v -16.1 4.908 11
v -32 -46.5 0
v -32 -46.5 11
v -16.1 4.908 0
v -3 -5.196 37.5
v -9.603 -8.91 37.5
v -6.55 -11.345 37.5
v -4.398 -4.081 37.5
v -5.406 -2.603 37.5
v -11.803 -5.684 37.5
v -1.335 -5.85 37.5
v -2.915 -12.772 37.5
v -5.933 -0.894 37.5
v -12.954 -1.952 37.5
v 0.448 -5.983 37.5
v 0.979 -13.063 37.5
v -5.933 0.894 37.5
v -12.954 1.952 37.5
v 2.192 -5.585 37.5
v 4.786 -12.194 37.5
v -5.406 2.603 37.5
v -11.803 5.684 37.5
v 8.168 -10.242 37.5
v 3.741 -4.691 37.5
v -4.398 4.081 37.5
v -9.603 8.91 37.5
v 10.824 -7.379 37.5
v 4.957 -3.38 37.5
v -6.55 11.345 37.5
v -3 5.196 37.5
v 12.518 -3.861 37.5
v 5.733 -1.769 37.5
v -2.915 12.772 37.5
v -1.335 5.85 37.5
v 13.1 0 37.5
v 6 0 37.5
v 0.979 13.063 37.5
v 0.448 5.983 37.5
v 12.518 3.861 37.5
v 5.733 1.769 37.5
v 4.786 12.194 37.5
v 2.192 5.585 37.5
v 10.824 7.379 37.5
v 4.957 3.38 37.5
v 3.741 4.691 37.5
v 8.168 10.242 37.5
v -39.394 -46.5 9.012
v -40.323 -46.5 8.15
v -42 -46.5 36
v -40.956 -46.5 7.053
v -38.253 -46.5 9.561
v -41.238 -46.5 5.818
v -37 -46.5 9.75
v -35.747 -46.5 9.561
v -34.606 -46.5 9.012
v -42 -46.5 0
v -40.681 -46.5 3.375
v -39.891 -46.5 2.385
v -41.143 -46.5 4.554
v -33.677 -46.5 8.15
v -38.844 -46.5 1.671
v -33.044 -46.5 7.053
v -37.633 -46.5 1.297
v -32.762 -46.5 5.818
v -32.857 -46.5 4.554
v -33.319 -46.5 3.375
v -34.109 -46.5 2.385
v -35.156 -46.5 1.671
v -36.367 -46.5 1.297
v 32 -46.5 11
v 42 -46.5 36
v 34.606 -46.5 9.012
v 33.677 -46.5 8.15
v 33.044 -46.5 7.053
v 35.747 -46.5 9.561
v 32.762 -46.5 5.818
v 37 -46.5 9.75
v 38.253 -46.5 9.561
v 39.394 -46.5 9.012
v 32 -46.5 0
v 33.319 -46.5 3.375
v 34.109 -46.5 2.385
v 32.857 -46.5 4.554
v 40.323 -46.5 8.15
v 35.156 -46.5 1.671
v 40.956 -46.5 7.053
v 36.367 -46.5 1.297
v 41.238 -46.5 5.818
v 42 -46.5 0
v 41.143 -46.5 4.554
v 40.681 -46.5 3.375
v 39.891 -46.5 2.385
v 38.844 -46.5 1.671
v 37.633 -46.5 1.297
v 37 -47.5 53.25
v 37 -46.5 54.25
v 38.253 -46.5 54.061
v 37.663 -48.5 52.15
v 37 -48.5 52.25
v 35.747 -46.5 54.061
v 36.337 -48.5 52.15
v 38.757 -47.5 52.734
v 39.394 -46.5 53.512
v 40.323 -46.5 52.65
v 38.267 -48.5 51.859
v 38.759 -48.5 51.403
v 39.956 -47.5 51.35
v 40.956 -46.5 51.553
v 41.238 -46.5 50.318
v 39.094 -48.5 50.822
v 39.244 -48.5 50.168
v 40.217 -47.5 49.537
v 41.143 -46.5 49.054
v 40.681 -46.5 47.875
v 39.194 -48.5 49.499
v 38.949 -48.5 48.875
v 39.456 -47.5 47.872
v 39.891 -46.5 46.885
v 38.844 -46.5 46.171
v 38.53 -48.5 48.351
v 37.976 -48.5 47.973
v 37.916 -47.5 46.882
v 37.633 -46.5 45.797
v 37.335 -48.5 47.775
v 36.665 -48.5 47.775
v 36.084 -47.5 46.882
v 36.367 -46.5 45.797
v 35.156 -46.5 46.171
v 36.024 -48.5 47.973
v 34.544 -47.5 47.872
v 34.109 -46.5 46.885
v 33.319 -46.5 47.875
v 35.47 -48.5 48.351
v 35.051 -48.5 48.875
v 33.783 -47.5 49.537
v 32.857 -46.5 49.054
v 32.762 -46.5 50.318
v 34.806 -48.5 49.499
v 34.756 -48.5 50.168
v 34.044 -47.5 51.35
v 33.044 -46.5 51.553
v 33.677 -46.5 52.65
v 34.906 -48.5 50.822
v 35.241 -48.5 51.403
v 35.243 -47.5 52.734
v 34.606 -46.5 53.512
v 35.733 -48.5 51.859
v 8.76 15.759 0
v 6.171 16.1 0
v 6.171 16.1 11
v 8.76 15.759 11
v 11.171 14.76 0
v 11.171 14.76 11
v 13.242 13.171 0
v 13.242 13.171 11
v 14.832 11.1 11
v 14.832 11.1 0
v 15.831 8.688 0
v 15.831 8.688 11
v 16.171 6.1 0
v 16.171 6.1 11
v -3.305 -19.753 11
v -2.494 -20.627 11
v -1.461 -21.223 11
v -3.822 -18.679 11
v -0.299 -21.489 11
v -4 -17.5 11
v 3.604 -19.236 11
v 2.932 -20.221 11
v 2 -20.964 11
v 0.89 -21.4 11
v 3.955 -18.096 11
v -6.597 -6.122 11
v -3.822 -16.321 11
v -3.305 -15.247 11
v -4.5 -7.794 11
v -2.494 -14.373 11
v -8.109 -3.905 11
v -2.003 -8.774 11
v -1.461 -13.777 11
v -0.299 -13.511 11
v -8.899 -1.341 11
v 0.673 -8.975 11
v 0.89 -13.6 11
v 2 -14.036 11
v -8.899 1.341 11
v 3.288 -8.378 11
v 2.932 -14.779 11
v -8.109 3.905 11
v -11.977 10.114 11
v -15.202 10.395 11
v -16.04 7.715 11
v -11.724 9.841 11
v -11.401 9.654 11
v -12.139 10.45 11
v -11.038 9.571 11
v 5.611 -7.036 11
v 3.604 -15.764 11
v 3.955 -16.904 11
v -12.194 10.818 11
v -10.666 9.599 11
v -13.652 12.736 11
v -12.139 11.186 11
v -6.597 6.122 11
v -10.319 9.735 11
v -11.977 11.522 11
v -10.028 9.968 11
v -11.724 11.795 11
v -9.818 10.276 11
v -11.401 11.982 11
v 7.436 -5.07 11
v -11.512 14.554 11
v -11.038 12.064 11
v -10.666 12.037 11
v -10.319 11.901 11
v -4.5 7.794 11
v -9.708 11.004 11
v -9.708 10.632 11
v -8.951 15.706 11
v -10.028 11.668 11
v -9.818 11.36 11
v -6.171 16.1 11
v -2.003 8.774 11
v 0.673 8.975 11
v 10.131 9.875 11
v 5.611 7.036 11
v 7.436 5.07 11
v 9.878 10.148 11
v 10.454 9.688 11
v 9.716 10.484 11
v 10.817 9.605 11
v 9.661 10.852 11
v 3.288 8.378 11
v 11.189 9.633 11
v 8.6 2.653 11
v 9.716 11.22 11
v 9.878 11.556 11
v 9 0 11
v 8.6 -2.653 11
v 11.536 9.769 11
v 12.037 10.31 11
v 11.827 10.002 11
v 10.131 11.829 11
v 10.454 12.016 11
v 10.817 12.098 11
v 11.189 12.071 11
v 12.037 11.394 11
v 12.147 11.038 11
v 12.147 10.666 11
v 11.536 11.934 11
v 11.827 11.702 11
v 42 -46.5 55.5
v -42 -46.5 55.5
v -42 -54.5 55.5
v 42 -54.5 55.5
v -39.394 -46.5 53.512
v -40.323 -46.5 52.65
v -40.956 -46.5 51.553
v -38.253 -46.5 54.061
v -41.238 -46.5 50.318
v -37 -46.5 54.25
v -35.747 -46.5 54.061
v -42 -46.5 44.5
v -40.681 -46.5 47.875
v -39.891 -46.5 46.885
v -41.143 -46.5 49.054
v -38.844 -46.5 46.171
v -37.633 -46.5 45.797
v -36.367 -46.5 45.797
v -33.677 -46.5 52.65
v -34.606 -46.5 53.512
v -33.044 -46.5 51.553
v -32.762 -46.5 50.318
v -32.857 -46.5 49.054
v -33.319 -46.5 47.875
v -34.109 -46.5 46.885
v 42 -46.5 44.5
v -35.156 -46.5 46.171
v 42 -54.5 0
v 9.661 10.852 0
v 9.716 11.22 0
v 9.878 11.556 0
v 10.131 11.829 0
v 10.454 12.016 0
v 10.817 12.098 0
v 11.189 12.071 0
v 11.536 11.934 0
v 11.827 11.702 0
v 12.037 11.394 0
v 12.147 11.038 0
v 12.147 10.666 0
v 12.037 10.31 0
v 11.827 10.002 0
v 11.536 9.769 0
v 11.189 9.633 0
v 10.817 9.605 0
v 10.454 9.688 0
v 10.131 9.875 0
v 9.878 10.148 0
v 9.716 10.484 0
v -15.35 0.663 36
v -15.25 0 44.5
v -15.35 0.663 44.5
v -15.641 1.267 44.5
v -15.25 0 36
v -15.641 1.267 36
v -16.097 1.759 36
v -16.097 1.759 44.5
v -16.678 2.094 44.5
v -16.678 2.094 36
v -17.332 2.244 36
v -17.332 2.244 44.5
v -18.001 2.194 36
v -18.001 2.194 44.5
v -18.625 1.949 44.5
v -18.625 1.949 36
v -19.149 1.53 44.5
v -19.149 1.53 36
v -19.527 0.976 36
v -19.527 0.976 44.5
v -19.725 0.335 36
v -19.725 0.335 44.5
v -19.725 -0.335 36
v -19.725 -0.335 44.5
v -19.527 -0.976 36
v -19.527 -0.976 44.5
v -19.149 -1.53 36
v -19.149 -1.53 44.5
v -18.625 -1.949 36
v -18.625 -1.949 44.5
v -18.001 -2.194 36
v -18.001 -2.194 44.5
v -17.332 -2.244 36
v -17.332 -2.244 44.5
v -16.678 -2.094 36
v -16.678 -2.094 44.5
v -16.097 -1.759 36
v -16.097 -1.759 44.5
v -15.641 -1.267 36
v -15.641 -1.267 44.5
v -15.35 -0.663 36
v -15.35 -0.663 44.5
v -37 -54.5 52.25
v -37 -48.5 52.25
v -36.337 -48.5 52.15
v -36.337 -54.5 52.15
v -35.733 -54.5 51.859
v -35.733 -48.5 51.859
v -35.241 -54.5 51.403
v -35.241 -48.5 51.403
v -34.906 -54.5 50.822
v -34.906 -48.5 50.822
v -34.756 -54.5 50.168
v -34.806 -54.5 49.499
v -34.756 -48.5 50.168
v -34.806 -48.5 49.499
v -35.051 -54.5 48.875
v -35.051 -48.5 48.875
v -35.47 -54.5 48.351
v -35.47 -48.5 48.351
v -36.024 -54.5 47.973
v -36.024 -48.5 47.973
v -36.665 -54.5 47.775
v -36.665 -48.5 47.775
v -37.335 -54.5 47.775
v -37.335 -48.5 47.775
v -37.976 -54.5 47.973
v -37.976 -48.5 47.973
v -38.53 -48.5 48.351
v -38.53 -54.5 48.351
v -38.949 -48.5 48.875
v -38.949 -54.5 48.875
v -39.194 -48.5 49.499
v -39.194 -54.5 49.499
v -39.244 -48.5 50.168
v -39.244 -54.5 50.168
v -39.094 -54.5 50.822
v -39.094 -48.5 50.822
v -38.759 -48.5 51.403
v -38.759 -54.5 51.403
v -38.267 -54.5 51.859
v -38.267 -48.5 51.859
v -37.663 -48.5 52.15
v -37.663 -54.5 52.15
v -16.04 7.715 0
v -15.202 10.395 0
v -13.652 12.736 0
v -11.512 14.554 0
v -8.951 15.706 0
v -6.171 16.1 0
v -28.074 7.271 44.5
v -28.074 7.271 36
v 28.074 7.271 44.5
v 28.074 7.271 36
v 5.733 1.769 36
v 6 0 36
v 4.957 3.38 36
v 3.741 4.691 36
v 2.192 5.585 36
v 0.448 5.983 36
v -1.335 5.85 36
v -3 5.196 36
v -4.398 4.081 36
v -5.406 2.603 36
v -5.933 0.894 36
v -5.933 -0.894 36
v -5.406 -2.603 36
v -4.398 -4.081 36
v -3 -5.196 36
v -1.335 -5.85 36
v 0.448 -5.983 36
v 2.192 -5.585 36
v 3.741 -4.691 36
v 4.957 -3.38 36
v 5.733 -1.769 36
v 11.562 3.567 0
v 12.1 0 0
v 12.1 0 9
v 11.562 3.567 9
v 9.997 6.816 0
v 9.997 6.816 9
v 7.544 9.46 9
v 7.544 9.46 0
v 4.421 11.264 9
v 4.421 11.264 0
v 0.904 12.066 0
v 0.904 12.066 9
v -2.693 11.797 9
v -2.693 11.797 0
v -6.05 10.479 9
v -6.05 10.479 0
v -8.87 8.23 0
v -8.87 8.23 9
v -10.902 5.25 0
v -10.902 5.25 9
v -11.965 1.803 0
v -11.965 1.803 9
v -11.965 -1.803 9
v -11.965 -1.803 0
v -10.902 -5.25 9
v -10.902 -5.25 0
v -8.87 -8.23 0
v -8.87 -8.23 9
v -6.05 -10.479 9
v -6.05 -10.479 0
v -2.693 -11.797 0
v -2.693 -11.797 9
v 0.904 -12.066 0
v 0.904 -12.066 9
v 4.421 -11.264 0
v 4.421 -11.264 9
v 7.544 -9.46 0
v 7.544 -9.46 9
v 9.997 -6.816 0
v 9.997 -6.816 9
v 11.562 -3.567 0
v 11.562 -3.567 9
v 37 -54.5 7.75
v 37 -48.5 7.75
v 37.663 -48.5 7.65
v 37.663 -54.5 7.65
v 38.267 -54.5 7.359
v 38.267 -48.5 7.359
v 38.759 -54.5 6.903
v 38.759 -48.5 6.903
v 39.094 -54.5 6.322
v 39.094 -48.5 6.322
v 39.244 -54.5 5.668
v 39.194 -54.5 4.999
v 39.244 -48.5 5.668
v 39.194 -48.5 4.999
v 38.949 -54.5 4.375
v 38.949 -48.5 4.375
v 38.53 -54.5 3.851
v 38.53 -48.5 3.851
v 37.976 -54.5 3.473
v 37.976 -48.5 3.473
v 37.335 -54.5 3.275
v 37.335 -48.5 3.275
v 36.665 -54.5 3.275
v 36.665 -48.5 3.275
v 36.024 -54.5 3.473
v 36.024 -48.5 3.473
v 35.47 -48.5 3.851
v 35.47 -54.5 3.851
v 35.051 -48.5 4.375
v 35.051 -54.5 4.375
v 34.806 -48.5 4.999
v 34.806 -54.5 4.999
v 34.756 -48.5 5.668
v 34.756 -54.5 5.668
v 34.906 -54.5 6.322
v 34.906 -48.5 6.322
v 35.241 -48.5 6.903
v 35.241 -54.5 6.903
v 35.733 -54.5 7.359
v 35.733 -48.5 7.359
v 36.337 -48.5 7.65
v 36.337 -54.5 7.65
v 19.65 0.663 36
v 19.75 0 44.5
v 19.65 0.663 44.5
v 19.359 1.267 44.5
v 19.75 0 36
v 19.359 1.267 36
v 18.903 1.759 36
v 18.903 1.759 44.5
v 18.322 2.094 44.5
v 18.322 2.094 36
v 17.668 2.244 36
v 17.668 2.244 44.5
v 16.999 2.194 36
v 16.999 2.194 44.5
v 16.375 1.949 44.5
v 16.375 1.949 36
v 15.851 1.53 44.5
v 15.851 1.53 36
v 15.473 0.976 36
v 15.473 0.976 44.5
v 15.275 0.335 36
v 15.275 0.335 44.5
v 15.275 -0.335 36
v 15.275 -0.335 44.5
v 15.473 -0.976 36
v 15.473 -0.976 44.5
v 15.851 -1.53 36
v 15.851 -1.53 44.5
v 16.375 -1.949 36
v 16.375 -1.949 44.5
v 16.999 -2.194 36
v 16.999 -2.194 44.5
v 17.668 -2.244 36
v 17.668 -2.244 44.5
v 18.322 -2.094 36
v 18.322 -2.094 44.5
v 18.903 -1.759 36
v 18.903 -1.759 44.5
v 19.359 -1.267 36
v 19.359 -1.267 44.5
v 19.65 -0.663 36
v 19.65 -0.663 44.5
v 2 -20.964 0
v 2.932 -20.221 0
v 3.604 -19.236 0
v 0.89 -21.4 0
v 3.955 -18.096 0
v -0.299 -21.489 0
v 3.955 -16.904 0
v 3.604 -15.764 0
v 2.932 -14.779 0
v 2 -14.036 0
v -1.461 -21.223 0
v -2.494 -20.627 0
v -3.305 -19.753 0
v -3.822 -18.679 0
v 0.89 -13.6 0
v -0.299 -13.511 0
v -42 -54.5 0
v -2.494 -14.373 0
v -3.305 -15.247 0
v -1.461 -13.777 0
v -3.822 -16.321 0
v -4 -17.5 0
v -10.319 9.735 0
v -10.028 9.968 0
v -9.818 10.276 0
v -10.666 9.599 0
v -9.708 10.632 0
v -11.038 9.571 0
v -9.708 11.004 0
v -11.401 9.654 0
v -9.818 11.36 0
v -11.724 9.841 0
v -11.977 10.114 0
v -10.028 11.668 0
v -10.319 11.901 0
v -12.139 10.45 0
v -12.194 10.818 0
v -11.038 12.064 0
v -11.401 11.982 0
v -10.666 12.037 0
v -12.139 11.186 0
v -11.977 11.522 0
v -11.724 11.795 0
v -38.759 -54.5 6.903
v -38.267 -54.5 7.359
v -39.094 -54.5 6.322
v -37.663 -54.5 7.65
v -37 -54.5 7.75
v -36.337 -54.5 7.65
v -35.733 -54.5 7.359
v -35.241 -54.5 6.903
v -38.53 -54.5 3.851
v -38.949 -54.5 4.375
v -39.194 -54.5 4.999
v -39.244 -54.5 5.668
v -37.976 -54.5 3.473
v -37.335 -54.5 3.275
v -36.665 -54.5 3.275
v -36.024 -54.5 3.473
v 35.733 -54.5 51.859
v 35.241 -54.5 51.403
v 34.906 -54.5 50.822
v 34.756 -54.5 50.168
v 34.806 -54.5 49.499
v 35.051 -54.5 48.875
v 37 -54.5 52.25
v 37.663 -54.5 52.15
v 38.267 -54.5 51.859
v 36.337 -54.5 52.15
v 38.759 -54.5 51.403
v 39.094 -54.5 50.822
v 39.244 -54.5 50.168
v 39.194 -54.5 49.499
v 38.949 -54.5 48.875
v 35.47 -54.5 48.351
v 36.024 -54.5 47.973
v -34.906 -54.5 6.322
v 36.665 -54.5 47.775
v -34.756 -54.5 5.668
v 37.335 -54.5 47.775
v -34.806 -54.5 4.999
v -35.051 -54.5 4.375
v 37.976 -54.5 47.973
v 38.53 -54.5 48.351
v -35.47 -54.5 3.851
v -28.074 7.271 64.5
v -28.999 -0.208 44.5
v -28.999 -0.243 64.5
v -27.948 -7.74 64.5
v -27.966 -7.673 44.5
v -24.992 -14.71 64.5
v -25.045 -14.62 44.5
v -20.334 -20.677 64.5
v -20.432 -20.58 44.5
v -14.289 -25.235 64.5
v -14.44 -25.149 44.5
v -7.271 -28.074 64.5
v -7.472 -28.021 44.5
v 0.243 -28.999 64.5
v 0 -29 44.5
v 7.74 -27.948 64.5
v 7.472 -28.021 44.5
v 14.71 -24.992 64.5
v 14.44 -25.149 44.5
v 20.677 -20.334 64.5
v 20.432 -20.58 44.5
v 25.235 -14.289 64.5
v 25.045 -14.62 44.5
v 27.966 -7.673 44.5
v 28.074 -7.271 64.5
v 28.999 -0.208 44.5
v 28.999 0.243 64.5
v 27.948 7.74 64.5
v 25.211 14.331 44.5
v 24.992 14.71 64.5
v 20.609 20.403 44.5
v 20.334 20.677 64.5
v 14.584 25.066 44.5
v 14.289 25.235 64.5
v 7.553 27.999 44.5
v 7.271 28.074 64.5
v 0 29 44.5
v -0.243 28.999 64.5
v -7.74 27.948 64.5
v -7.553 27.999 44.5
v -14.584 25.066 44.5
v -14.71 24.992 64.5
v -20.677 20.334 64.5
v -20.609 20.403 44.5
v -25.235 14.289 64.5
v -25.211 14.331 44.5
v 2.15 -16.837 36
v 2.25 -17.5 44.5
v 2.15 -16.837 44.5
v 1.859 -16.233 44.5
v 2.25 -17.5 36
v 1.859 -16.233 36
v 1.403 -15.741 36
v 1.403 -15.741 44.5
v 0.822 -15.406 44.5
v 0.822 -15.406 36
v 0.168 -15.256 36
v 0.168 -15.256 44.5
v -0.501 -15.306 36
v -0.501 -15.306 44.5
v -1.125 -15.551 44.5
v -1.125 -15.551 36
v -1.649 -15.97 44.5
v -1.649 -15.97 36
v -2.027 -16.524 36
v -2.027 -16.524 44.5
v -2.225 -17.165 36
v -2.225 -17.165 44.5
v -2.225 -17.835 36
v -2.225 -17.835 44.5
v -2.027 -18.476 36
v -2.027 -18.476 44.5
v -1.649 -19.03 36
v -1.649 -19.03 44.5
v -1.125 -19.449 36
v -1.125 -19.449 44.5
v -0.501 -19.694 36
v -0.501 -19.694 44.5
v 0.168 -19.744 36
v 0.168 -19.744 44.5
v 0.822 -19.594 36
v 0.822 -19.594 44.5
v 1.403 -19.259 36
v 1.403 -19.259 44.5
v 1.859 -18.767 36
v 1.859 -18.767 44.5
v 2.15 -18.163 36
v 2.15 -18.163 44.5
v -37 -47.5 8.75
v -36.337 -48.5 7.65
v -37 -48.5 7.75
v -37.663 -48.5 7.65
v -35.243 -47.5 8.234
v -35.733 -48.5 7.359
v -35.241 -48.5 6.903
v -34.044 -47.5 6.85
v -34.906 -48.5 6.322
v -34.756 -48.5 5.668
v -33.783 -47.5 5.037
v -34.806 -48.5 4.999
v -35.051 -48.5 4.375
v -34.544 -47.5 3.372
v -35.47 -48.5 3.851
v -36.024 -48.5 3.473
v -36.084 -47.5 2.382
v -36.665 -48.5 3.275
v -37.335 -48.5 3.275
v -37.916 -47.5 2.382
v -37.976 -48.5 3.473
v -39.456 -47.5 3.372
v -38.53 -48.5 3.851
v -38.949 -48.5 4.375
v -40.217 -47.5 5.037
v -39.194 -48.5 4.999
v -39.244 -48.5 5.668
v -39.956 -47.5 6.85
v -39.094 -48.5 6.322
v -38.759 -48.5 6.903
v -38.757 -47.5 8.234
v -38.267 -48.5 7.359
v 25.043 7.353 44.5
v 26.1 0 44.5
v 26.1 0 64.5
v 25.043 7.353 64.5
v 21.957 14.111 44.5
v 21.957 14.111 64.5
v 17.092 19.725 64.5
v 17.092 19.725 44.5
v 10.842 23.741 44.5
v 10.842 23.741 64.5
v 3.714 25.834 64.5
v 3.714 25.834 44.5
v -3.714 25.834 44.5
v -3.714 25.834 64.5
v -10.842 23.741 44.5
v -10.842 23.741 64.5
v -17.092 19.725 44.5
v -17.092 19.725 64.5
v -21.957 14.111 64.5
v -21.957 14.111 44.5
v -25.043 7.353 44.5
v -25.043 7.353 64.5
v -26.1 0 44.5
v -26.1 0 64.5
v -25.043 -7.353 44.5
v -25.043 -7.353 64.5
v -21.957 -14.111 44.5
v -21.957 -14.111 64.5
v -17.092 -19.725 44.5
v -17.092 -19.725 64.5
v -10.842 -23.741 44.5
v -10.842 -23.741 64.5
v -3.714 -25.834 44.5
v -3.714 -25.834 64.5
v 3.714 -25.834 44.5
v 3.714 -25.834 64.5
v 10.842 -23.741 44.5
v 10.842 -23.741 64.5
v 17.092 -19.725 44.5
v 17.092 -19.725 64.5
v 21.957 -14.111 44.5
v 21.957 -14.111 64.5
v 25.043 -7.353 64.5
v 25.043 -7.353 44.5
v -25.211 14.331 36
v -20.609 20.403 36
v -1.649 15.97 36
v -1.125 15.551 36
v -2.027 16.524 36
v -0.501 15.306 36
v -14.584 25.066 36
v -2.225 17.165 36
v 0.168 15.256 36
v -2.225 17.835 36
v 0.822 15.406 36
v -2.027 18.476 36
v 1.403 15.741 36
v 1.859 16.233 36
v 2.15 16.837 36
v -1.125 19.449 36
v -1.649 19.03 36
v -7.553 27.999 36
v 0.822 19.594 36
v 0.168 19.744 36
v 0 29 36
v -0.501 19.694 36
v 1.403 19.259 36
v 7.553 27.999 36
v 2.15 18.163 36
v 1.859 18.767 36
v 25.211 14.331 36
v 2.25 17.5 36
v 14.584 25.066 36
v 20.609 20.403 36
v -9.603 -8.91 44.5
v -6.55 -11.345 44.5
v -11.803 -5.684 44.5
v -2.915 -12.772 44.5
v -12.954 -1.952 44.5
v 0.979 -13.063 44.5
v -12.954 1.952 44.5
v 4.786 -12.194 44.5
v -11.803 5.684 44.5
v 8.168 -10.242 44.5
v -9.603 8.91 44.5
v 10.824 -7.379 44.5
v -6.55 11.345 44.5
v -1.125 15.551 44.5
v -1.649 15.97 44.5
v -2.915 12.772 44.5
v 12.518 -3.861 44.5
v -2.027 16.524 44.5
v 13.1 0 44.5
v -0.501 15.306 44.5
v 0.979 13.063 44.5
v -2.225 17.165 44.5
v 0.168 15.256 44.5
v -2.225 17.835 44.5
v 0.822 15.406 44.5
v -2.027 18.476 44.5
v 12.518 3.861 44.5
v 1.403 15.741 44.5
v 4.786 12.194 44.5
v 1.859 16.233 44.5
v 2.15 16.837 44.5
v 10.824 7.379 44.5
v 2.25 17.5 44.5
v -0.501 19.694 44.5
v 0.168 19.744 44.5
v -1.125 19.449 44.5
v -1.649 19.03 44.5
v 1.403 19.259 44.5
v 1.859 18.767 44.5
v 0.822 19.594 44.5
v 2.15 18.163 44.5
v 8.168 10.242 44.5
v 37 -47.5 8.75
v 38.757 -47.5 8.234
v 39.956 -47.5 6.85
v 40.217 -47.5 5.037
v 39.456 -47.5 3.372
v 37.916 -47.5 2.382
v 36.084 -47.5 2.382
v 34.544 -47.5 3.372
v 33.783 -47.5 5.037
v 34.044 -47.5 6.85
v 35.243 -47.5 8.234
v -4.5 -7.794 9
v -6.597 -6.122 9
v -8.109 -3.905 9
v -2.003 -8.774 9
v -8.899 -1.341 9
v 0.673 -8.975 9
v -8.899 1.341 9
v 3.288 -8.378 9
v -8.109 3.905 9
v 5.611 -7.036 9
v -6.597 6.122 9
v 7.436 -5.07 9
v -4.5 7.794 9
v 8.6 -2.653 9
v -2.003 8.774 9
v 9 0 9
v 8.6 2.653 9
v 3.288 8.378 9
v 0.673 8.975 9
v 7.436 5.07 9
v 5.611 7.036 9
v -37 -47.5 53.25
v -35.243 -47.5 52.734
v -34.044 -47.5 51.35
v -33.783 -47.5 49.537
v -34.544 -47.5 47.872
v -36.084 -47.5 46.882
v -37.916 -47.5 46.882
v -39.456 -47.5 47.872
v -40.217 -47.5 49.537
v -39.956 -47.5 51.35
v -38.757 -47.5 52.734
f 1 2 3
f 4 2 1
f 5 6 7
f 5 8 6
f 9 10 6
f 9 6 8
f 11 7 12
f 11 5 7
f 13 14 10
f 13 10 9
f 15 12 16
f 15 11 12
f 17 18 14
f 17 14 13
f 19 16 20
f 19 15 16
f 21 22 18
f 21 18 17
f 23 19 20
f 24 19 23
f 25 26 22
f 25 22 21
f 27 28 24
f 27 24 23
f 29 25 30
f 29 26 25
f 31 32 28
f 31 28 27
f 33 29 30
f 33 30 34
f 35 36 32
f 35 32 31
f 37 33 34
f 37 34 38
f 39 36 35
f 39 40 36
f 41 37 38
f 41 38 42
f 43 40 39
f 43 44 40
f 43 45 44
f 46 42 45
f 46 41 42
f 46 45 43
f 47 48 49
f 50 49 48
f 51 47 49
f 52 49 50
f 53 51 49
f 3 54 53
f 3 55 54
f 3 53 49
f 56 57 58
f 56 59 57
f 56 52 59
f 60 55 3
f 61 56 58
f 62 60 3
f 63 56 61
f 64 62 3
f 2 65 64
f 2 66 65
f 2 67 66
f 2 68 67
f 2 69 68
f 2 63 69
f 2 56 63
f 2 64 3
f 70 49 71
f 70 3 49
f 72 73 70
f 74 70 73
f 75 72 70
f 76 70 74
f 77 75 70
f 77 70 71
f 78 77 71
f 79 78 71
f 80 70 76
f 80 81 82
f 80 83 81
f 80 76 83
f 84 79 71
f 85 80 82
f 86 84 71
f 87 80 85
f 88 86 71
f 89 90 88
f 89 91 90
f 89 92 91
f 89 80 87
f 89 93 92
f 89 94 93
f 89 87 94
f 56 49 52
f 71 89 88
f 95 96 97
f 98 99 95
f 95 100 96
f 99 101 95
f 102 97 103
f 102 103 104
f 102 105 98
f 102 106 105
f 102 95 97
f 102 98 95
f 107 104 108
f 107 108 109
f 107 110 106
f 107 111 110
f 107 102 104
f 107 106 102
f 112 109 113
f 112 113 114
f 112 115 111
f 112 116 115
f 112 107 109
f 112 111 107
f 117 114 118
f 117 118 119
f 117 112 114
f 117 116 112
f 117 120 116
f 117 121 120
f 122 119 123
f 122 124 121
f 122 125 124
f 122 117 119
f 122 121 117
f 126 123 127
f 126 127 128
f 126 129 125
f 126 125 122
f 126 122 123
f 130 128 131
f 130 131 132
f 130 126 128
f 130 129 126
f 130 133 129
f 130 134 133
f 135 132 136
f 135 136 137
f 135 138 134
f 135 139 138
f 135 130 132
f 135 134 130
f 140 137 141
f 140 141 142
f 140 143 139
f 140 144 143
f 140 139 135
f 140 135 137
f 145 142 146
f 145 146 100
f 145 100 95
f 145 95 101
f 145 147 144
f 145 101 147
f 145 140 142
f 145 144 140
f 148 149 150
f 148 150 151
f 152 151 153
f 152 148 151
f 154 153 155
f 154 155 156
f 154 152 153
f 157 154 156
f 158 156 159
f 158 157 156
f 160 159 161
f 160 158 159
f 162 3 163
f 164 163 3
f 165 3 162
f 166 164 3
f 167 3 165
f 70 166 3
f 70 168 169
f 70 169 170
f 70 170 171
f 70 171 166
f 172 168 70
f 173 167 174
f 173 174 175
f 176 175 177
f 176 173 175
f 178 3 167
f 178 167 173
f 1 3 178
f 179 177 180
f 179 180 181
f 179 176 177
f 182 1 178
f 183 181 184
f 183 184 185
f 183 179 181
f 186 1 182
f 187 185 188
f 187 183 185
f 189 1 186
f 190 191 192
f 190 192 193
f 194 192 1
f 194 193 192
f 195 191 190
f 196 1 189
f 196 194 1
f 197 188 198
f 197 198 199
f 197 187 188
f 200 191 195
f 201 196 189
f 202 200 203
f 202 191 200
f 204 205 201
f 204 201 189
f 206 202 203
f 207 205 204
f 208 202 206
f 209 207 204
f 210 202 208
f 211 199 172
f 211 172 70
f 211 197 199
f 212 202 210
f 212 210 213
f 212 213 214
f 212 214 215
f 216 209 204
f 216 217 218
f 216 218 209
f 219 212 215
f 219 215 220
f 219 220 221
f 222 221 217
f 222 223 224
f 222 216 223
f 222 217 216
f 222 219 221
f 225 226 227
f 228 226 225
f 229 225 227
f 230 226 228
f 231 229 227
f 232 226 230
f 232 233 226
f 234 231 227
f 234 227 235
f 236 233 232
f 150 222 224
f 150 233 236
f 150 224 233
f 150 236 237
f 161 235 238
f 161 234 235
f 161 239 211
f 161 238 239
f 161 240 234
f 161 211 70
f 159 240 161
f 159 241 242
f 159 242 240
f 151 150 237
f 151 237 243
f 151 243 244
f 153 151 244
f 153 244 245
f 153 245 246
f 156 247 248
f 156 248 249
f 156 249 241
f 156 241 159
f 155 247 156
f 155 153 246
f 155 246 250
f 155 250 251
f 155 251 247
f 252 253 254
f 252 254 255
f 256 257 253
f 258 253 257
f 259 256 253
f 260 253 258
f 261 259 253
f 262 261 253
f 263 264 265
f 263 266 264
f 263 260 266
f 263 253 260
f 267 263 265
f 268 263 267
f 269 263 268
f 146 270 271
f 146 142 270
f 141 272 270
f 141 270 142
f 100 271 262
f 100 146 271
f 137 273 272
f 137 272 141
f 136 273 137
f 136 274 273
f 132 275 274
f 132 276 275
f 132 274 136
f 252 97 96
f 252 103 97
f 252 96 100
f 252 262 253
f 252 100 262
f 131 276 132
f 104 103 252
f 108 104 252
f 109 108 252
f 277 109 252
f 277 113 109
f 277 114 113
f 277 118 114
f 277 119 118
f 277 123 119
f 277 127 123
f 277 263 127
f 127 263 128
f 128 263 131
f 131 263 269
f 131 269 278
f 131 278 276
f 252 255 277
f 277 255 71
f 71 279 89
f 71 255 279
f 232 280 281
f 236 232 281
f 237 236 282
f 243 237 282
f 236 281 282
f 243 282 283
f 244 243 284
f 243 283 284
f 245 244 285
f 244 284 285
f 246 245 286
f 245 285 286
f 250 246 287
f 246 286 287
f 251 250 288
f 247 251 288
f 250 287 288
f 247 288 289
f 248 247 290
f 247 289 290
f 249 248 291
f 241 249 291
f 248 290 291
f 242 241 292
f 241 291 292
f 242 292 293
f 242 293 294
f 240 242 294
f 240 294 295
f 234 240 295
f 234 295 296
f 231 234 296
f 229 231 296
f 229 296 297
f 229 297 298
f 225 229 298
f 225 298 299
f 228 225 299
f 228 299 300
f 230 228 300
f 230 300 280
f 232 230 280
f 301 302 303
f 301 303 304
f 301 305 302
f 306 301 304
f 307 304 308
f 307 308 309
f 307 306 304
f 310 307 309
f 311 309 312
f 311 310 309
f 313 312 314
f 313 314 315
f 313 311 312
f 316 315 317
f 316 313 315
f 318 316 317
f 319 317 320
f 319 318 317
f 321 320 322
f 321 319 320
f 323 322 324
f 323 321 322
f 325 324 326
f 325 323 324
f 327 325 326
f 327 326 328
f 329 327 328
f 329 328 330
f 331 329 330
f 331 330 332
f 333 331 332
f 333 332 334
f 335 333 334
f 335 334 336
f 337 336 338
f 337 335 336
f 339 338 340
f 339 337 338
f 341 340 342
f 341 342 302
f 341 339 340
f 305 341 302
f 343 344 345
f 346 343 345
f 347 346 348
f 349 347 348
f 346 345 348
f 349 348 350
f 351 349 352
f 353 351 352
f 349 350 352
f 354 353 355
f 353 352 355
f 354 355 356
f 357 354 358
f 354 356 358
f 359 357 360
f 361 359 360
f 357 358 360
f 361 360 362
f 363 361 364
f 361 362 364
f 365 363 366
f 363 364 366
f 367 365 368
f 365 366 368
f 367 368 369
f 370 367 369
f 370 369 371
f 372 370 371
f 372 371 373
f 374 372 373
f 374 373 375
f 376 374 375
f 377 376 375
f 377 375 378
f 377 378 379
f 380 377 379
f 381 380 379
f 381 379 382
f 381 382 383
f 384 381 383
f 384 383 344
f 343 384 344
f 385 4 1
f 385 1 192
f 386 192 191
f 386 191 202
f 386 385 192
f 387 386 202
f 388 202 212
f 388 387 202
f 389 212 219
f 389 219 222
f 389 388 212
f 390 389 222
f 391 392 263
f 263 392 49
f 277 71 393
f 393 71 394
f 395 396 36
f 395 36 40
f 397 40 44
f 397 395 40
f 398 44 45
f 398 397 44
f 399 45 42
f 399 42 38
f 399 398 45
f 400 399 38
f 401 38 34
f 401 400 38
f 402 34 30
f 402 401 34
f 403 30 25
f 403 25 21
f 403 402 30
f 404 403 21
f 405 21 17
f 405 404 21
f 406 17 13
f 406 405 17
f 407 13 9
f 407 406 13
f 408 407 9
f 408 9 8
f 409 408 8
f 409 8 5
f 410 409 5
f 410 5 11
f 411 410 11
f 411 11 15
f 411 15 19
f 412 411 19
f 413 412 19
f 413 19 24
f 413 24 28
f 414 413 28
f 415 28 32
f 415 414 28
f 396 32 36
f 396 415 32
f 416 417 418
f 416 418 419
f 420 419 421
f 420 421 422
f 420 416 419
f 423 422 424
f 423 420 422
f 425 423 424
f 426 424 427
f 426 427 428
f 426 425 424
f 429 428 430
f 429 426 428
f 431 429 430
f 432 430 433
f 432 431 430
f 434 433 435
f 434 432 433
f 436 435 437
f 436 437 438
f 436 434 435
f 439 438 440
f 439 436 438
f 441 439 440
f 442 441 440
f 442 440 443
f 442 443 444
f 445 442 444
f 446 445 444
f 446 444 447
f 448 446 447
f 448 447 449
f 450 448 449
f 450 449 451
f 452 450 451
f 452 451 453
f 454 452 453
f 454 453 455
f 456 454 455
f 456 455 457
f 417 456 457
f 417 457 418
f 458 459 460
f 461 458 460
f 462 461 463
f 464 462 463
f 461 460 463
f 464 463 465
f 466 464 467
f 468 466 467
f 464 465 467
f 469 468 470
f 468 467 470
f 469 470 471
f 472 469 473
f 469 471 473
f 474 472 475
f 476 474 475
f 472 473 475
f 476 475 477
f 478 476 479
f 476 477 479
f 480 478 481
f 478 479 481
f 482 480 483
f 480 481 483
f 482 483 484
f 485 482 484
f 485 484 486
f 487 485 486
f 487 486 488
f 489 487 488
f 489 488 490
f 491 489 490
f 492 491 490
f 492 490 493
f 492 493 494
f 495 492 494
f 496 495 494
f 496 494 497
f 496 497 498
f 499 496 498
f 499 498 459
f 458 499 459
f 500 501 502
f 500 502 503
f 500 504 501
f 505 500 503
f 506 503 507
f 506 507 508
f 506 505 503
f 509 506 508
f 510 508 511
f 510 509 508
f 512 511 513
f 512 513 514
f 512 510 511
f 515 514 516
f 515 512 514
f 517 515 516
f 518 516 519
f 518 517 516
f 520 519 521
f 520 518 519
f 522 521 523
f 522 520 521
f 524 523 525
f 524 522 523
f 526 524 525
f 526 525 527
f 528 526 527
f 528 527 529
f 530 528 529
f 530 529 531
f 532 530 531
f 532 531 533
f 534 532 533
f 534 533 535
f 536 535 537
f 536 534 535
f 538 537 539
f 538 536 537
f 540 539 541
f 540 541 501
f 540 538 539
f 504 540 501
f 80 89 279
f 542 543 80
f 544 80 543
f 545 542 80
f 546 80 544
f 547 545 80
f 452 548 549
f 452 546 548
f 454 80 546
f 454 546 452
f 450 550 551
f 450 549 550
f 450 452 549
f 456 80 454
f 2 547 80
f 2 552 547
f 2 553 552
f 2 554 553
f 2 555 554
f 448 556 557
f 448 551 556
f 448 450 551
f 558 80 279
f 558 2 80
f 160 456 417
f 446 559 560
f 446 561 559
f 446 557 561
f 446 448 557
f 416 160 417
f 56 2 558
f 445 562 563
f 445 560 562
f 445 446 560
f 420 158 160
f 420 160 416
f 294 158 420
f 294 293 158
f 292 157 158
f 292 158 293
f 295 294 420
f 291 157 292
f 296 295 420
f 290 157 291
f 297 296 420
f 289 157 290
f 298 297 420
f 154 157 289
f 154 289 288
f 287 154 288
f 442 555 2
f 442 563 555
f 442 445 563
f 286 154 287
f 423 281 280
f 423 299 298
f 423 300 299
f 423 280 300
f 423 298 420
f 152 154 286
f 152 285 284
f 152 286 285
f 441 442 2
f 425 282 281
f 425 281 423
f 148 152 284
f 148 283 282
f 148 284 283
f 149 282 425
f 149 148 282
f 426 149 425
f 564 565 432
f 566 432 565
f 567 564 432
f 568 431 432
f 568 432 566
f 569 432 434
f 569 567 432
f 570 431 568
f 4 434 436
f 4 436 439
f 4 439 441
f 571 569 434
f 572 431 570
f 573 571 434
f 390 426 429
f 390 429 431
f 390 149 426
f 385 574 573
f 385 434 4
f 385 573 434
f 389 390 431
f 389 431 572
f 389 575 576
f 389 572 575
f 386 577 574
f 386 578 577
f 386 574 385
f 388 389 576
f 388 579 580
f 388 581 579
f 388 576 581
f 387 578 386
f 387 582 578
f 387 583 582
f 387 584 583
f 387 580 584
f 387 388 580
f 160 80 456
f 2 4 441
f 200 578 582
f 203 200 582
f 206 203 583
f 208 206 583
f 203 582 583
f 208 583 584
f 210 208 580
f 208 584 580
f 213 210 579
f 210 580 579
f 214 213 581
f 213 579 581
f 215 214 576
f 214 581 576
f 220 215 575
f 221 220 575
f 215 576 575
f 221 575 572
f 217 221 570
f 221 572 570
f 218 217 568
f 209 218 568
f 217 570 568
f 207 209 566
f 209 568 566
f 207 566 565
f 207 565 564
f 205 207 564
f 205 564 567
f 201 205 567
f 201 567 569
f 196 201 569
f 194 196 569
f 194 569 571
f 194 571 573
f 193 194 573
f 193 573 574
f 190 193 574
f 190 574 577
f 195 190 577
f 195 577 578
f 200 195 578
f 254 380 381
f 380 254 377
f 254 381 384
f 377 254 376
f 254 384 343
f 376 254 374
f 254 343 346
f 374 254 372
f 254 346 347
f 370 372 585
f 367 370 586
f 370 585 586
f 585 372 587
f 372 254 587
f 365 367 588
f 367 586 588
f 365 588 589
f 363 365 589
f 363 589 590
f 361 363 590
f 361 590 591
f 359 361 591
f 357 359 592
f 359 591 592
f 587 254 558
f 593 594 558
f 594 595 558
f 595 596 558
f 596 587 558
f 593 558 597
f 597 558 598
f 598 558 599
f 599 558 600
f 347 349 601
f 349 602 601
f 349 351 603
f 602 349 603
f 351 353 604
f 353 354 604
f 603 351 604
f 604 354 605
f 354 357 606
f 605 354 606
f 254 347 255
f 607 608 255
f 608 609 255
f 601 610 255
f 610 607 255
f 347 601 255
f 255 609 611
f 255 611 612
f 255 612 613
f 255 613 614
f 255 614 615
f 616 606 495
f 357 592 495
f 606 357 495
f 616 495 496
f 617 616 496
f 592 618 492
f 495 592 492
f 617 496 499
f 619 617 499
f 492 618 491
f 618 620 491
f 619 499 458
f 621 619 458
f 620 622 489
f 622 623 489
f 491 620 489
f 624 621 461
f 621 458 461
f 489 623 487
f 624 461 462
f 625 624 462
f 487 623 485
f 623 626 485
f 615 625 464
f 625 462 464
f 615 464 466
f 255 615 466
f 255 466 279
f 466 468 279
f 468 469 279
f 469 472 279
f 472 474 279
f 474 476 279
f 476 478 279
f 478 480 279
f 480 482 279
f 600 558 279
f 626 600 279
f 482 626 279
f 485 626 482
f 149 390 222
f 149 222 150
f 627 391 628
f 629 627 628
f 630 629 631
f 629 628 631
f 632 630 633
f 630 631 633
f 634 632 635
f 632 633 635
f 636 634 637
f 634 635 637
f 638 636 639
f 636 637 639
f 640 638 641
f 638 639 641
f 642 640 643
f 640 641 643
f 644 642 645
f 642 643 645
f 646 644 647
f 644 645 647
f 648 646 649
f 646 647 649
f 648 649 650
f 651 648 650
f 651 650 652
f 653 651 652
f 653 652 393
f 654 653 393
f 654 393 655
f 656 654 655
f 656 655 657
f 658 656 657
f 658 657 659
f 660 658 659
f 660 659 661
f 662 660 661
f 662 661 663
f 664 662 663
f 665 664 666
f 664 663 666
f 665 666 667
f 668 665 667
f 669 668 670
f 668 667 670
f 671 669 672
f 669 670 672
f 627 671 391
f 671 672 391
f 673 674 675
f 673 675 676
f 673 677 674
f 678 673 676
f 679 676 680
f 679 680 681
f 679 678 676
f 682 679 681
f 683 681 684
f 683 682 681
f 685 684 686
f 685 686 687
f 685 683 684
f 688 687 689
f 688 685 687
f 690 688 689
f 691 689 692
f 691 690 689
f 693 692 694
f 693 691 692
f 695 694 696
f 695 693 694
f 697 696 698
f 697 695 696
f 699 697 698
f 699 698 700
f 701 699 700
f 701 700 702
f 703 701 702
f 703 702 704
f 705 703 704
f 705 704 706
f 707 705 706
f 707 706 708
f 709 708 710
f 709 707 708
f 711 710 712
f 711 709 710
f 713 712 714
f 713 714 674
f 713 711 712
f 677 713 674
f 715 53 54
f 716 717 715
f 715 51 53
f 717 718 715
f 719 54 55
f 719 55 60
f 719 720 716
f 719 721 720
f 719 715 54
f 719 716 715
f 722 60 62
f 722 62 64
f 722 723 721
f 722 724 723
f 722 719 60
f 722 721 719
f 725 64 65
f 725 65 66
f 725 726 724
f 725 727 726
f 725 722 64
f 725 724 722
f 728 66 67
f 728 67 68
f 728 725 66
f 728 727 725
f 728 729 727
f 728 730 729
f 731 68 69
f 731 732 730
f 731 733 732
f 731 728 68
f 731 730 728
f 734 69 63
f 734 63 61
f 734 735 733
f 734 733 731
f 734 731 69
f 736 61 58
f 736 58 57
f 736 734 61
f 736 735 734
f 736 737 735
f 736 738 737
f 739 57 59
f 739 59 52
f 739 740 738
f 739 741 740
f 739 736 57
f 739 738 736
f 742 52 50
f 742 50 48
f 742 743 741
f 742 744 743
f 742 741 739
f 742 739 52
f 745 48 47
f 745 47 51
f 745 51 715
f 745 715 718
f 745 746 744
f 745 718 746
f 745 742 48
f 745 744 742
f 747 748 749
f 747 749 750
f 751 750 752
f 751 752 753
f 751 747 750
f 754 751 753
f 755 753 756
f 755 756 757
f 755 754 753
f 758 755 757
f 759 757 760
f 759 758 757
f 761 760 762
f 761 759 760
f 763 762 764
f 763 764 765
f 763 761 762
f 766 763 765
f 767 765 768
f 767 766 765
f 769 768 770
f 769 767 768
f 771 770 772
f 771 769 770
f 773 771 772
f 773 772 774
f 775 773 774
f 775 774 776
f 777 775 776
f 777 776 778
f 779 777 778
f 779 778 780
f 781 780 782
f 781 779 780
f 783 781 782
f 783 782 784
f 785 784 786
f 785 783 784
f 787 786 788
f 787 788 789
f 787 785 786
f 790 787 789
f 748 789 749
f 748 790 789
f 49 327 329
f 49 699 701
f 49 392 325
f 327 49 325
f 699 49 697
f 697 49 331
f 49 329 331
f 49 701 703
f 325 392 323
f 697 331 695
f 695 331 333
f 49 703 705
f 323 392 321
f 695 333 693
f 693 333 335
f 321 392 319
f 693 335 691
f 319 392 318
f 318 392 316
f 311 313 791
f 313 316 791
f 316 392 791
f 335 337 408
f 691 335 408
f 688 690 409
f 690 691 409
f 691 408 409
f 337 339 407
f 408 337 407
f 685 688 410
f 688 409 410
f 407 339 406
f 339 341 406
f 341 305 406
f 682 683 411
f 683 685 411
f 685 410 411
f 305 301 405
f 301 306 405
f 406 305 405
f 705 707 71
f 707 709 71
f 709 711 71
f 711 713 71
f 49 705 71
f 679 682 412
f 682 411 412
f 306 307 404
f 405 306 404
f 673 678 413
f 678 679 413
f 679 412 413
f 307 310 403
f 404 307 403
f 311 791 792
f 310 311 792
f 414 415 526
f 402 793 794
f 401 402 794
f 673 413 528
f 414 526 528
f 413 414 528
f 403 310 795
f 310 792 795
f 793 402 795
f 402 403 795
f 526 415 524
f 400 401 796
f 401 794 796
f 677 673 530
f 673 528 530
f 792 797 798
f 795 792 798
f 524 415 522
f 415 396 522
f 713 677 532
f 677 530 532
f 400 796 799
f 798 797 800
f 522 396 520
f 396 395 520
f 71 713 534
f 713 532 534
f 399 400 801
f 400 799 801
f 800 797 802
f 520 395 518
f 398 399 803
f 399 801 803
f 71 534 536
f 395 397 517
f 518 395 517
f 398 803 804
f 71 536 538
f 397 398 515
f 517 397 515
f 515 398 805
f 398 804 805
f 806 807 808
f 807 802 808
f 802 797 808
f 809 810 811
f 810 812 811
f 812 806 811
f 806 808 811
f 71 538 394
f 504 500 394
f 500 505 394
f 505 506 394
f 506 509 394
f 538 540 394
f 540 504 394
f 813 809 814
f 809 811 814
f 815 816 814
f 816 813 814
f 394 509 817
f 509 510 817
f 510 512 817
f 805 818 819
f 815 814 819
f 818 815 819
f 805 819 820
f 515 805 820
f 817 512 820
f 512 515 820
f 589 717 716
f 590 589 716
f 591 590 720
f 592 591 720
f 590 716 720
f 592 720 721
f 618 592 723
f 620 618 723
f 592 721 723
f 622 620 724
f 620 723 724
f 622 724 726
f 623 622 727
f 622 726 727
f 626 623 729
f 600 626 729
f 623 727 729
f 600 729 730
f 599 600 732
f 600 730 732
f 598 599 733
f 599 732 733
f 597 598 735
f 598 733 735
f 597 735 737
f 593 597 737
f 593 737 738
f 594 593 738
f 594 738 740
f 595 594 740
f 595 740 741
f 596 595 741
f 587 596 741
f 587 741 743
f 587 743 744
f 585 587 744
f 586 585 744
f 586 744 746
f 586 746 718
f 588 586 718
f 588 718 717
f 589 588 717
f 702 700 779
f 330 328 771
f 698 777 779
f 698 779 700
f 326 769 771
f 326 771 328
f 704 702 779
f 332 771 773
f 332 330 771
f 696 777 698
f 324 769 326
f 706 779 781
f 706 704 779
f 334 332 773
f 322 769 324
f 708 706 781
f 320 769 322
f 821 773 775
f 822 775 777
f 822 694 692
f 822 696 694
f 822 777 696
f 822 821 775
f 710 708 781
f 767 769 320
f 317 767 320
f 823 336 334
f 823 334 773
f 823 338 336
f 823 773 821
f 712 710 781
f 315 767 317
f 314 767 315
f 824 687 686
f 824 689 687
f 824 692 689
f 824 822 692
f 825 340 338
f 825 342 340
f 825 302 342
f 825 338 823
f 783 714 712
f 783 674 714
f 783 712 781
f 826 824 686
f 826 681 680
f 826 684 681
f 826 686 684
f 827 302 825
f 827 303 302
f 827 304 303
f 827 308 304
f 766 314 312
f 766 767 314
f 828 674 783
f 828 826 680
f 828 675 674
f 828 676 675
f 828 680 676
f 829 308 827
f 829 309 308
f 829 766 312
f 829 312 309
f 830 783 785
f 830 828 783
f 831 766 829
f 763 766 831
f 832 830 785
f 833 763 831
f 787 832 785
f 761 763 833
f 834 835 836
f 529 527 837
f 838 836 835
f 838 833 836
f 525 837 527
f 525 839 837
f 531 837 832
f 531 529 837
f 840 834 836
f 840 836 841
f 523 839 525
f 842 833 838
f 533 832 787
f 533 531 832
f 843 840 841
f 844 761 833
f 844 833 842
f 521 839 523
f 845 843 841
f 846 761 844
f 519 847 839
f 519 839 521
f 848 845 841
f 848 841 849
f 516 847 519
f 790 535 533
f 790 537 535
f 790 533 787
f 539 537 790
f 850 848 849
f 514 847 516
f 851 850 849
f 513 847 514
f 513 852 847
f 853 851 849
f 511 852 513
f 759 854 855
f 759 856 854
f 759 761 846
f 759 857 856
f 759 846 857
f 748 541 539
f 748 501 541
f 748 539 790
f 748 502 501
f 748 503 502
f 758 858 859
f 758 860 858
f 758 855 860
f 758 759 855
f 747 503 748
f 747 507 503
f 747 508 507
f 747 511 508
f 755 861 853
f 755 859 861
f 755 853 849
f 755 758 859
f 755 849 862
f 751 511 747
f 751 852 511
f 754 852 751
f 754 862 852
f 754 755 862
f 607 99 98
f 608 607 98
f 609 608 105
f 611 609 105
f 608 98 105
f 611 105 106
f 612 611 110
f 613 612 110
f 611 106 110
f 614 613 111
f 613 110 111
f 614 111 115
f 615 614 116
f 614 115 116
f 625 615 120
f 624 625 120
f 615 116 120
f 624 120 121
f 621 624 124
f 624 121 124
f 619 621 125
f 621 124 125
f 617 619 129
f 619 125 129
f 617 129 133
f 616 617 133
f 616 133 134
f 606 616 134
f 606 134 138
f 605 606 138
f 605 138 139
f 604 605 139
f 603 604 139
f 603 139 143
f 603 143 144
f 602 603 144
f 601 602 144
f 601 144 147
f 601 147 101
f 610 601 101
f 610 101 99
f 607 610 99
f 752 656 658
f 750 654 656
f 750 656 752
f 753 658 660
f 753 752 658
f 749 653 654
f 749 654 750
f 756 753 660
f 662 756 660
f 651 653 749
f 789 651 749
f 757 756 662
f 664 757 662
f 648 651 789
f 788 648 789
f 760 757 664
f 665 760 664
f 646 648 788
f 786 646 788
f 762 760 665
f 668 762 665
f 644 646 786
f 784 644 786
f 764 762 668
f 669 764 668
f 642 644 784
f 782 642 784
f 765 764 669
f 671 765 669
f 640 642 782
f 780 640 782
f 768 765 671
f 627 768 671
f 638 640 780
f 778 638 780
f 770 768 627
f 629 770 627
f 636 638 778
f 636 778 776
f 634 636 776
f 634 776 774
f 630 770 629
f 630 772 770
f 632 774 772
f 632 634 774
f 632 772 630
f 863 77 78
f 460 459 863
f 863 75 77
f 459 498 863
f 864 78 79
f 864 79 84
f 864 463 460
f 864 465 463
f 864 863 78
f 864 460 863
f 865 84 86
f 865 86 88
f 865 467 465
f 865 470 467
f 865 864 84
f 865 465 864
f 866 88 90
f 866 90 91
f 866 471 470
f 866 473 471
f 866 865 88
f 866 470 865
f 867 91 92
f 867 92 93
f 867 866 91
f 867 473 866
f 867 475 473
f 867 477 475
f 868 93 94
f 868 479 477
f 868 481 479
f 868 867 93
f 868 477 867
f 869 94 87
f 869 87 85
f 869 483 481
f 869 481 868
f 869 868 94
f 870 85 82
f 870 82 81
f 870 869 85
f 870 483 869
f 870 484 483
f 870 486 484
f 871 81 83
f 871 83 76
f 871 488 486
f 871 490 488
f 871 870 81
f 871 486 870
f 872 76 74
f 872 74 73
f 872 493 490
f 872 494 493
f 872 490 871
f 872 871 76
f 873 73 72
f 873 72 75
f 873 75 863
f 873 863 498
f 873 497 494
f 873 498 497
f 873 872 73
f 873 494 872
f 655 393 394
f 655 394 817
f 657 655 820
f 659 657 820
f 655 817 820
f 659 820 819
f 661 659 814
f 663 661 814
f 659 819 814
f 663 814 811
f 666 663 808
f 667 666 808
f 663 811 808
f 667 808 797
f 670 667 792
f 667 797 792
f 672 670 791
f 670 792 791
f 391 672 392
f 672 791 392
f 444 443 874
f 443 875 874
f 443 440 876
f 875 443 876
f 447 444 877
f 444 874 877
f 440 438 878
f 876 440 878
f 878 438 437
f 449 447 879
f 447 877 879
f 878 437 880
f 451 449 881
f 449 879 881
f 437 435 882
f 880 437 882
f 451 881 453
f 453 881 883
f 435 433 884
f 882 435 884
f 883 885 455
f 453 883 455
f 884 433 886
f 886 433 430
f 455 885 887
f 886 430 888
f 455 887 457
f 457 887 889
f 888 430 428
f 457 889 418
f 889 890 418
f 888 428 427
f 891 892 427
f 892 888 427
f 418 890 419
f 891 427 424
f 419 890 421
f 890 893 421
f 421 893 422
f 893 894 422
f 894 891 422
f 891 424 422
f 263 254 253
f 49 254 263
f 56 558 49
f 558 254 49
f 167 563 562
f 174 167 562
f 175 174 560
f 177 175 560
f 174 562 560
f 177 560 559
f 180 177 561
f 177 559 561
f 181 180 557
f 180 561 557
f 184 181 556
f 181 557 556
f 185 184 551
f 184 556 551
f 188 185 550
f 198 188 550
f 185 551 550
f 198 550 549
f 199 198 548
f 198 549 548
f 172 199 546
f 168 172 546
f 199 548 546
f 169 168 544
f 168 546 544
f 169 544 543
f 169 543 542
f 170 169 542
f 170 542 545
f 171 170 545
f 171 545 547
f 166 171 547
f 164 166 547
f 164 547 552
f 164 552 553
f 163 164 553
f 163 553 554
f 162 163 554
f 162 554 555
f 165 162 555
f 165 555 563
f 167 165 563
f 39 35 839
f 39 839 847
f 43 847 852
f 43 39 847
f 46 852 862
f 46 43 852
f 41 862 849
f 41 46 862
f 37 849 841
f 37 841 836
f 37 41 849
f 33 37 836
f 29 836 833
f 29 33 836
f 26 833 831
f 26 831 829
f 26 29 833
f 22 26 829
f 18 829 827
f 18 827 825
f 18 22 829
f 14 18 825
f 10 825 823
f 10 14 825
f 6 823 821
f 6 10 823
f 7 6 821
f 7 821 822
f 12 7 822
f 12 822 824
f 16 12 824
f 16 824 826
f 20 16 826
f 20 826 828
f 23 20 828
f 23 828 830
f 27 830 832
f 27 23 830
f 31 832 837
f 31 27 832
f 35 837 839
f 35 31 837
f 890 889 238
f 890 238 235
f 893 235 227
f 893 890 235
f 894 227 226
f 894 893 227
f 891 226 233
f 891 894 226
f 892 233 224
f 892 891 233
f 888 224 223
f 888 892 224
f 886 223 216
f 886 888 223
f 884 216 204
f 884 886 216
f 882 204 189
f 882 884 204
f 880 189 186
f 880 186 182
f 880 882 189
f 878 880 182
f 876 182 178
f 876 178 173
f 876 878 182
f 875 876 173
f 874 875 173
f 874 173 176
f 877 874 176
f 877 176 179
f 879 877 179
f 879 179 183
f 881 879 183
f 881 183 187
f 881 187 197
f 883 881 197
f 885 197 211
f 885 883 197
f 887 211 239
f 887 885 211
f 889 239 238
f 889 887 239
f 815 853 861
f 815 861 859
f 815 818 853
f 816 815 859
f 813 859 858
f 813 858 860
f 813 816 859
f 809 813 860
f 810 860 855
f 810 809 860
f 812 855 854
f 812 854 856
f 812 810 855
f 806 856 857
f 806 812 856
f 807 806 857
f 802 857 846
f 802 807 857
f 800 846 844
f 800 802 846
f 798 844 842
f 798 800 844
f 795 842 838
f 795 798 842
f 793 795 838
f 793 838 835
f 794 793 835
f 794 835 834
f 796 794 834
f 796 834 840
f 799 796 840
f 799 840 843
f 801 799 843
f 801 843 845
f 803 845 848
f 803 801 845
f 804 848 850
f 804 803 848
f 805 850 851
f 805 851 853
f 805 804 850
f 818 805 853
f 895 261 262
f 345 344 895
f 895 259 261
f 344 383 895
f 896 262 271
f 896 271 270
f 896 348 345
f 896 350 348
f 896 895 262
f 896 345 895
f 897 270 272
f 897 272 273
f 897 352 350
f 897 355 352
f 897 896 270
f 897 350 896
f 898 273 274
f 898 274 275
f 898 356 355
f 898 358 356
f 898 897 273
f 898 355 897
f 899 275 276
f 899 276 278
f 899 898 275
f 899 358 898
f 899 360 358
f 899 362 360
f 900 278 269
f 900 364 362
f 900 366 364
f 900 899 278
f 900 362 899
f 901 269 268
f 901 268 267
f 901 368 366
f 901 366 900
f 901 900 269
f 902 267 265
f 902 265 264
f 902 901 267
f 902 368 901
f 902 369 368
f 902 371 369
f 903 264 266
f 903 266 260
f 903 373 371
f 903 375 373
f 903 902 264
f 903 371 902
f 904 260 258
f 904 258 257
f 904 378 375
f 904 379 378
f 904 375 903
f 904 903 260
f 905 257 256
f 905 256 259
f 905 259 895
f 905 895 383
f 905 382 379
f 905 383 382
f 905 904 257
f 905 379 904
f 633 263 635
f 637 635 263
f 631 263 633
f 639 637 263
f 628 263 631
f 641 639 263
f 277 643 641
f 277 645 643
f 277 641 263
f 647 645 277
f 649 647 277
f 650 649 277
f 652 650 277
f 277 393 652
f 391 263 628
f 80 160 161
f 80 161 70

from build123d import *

# Parameters (mm, degrees)
SCHIZZO1_R                   = 12.1
ESTRUSIONE_ESTRUSIONE1_DEPTH = 11
ESTRUSIONE_ESTRUSIONE2_START = -2
SCHIZZO2_R                   = 12.1
SCHIZZO2_R_2                 = 9
ESTRUSIONE_ESTRUSIONE2_DEPTH = 2
SCHIZZO3_R                   = 2.25
TAGLIO_ESTRUSIONE1_DEPTH     = 77.182412669
SMUSSO1_SIZE                 = 2
SCHIZZO4_R                   = 1.25
TAGLIO_ESTRUSIONE2_DEPTH     = 70.679623994
SCHIZZO5_W                   = 84
SCHIZZO5_H                   = 8
ESTRUSIONE_ESTRUSIONE3_DEPTH = 25
SCHIZZO6_R                   = 2.25
SCHIZZO6_R_2                 = 6
ESTRUSIONE_ESTRUSIONE4_DEPTH = 1.5
SCHIZZO7_R                   = 2.25
SCHIZZO7_R_2                 = 13.1
ESTRUSIONE_ESTRUSIONE5_DEPTH = 7
SCHIZZO8_R                   = 29
SCHIZZO8_R_2                 = 26.1
ESTRUSIONE_ESTRUSIONE6_DEPTH = 20
TAGLIO_ESTRUSIONE4_REACH     = 96.311
SCHIZZO9_R                   = 4
SCHIZZO10_W                  = 84
SCHIZZO10_H                  = 8
ESTRUSIONE_ESTRUSIONE7_DEPTH = 11
SCHIZZO11_R                  = 2.25
TAGLIO_ESTRUSIONE5_DEPTH     = 108.816974545
SMUSSO2_SIZE                 = 2


with BuildPart() as part:
    # Schizzo1 → Estrusione-Estrusione1 (new body)
    with BuildSketch(Plane.XY):
        with BuildLine():
            Line((-6.171311325, 16.1), (6.171311325, 16.1))
            ThreePointArc((6.171311325, 16.1), (13.242379137, 13.171067812), (16.171311325, 6.1))
            Line((16.171311325, 6.1), (32, -46.5))
            Line((32, -46.5), (42, -46.5))
            Line((42, -46.5), (42, -54.5))
            Line((42, -54.5), (17, -54.5))
            Line((17, -54.5), (-17, -54.5))
            Line((-17, -54.5), (-42, -54.5))
            Line((-42, -54.5), (-42, -46.5))
            Line((-42, -46.5), (-32, -46.5))
            Line((-32, -46.5), (-16.1, 4.907883736))
            ThreePointArc((-16.1, 4.907883736), (-13.651991863, 12.73622021), (-6.171311325, 16.1))
        make_face()
        Circle(SCHIZZO1_R, mode=Mode.SUBTRACT)
    extrude(amount=ESTRUSIONE_ESTRUSIONE1_DEPTH)

    # Schizzo2 → Estrusione-Estrusione2 (add)
    with BuildSketch(Plane.XY.offset(11).offset(ESTRUSIONE_ESTRUSIONE2_START)):
        Circle(SCHIZZO2_R)
        Circle(SCHIZZO2_R_2, mode=Mode.SUBTRACT)
    extrude(amount=ESTRUSIONE_ESTRUSIONE2_DEPTH)

    # Schizzo3 → Taglio-Estrusione1 (cut, through all)
    with BuildSketch(Plane(origin=(0, -46.5, 0), x_dir=(1, 0, 0), z_dir=(0, 1, 0))):
        with Locations(Location((37, -5.5, 0), (0, 0, 270))):
            Circle(SCHIZZO3_R)
        with Locations(Location((-37, -5.5, 0), (0, 0, 270))):
            Circle(SCHIZZO3_R)
    extrude(amount=-TAGLIO_ESTRUSIONE1_DEPTH, mode=Mode.SUBTRACT)

    # Smusso1
    smusso1_edges = [part.edges().sort_by_distance(p)[0] for p in [
        (37, -46.5, 3.25),
        (-37, -46.5, 3.25),
    ]]
    chamfer(smusso1_edges, length=SMUSSO1_SIZE)

    # Schizzo4 → Taglio-Estrusione2 (cut, through all)
    with BuildSketch(Plane(origin=(0, 0, 0), x_dir=(-1, 0, 0), z_dir=(0, 0, -1))):
        with Locations((-10.910719744, 10.851964601)):
            Circle(SCHIZZO4_R)
        with Locations((10.944459062, 10.817992606)):
            Circle(SCHIZZO4_R)
        with Locations((0, -15.38859776)):
            Circle(SCHIZZO4_R)
    extrude(amount=-TAGLIO_ESTRUSIONE2_DEPTH, mode=Mode.SUBTRACT)

    # Schizzo5 → Estrusione-Estrusione3 (add)
    with BuildSketch(Plane.XY.offset(11)):
        with Locations((0, -50.5)):
            Rectangle(SCHIZZO5_W, SCHIZZO5_H)
    extrude(amount=ESTRUSIONE_ESTRUSIONE3_DEPTH)

    # Schizzo6 → Estrusione-Estrusione4 (add)
    with BuildSketch(Plane.XY.offset(36)):
        with BuildLine():
            Line((-28.073726485, 7.270892739), (-42, -46.5))
            Line((-42, -46.5), (-42, -54.5))
            Line((-42, -54.5), (42, -54.5))
            Line((42, -54.5), (42, -46.5))
            Line((42, -46.5), (28.073726485, 7.270892739))
            ThreePointArc((28.073726485, 7.270892739), (0, 29), (-28.073726485, 7.270892739))
        make_face()
        with Locations((17.5, 0)):
            Circle(SCHIZZO6_R, mode=Mode.SUBTRACT)
        with Locations((0, -17.5)):
            Circle(SCHIZZO6_R, mode=Mode.SUBTRACT)
        with Locations((-17.5, 0)):
            Circle(SCHIZZO6_R, mode=Mode.SUBTRACT)
        with Locations((0, 17.5)):
            Circle(SCHIZZO6_R, mode=Mode.SUBTRACT)
        Circle(SCHIZZO6_R_2, mode=Mode.SUBTRACT)
    extrude(amount=ESTRUSIONE_ESTRUSIONE4_DEPTH)

    # Schizzo7 → Estrusione-Estrusione5 (add)
    with BuildSketch(Plane.XY.offset(37.5)):
        with BuildLine():
            Line((42, -46.5), (28.073726485, 7.270892739))
            ThreePointArc((28.073726485, 7.270892739), (0, 29), (-28.073726485, 7.270892739))
            Line((-28.073726485, 7.270892739), (-42, -46.5))
            Line((-42, -46.5), (-42, -54.5))
            Line((-42, -54.5), (42, -54.5))
            Line((42, -54.5), (42, -46.5))
        make_face()
        with Locations((0, -17.5)):
            Circle(SCHIZZO7_R, mode=Mode.SUBTRACT)
        with Locations((17.5, 0)):
            Circle(SCHIZZO7_R, mode=Mode.SUBTRACT)
        with Locations((0, 17.5)):
            Circle(SCHIZZO7_R, mode=Mode.SUBTRACT)
        with Locations((-17.5, 0)):
            Circle(SCHIZZO7_R, mode=Mode.SUBTRACT)
        Circle(SCHIZZO7_R_2, mode=Mode.SUBTRACT)
    extrude(amount=ESTRUSIONE_ESTRUSIONE5_DEPTH)

    # Schizzo8 → Estrusione-Estrusione6 (add)
    with BuildSketch(Plane.XY.offset(44.5)):
        with Locations(Location((0, 0, 0), (0, 0, 165.479851844))):
            Circle(SCHIZZO8_R)
        Circle(SCHIZZO8_R_2, mode=Mode.SUBTRACT)
    extrude(amount=ESTRUSIONE_ESTRUSIONE6_DEPTH)

    # Schizzo9 → Taglio-Estrusione4 (cut, up to next)
    with BuildSketch(Plane(origin=(0, 0, 0), x_dir=(-1, 0, 0), z_dir=(0, 0, -1)), mode=Mode.PRIVATE) as taglio_estrusione4_sk1:
        with Locations((0, -17.5)):
            Circle(SCHIZZO9_R)
    taglio_estrusione4_tool1 = extrude(taglio_estrusione4_sk1.sketch, amount=-TAGLIO_ESTRUSIONE4_REACH, mode=Mode.PRIVATE) & part.part
    add(taglio_estrusione4_tool1.solids().sort_by_distance((0, -17.5, 0))[0], mode=Mode.SUBTRACT)

    # Schizzo10 → Estrusione-Estrusione7 (add)
    with BuildSketch(Plane.XY.offset(44.5)):
        with Locations((0, -50.5)):
            Rectangle(SCHIZZO10_W, SCHIZZO10_H)
    extrude(amount=ESTRUSIONE_ESTRUSIONE7_DEPTH)

    # Schizzo11 → Taglio-Estrusione5 (cut, through all)
    with BuildSketch(Plane(origin=(0, -46.5, 0), x_dir=(1, 0, 0), z_dir=(0, 1, 0))):
        with Locations(Location((-37, -50, 0), (0, 0, 270))):
            Circle(SCHIZZO11_R)
        with Locations(Location((37, -50, 0), (0, 0, 270))):
            Circle(SCHIZZO11_R)
    extrude(amount=-TAGLIO_ESTRUSIONE5_DEPTH, mode=Mode.SUBTRACT)

    # Smusso2
    smusso2_edges = [part.edges().sort_by_distance(p)[0] for p in [
        (-37, -46.5, 47.75),
        (37, -46.5, 47.75),
    ]]
    chamfer(smusso2_edges, length=SMUSSO2_SIZE)


solid = part.part
